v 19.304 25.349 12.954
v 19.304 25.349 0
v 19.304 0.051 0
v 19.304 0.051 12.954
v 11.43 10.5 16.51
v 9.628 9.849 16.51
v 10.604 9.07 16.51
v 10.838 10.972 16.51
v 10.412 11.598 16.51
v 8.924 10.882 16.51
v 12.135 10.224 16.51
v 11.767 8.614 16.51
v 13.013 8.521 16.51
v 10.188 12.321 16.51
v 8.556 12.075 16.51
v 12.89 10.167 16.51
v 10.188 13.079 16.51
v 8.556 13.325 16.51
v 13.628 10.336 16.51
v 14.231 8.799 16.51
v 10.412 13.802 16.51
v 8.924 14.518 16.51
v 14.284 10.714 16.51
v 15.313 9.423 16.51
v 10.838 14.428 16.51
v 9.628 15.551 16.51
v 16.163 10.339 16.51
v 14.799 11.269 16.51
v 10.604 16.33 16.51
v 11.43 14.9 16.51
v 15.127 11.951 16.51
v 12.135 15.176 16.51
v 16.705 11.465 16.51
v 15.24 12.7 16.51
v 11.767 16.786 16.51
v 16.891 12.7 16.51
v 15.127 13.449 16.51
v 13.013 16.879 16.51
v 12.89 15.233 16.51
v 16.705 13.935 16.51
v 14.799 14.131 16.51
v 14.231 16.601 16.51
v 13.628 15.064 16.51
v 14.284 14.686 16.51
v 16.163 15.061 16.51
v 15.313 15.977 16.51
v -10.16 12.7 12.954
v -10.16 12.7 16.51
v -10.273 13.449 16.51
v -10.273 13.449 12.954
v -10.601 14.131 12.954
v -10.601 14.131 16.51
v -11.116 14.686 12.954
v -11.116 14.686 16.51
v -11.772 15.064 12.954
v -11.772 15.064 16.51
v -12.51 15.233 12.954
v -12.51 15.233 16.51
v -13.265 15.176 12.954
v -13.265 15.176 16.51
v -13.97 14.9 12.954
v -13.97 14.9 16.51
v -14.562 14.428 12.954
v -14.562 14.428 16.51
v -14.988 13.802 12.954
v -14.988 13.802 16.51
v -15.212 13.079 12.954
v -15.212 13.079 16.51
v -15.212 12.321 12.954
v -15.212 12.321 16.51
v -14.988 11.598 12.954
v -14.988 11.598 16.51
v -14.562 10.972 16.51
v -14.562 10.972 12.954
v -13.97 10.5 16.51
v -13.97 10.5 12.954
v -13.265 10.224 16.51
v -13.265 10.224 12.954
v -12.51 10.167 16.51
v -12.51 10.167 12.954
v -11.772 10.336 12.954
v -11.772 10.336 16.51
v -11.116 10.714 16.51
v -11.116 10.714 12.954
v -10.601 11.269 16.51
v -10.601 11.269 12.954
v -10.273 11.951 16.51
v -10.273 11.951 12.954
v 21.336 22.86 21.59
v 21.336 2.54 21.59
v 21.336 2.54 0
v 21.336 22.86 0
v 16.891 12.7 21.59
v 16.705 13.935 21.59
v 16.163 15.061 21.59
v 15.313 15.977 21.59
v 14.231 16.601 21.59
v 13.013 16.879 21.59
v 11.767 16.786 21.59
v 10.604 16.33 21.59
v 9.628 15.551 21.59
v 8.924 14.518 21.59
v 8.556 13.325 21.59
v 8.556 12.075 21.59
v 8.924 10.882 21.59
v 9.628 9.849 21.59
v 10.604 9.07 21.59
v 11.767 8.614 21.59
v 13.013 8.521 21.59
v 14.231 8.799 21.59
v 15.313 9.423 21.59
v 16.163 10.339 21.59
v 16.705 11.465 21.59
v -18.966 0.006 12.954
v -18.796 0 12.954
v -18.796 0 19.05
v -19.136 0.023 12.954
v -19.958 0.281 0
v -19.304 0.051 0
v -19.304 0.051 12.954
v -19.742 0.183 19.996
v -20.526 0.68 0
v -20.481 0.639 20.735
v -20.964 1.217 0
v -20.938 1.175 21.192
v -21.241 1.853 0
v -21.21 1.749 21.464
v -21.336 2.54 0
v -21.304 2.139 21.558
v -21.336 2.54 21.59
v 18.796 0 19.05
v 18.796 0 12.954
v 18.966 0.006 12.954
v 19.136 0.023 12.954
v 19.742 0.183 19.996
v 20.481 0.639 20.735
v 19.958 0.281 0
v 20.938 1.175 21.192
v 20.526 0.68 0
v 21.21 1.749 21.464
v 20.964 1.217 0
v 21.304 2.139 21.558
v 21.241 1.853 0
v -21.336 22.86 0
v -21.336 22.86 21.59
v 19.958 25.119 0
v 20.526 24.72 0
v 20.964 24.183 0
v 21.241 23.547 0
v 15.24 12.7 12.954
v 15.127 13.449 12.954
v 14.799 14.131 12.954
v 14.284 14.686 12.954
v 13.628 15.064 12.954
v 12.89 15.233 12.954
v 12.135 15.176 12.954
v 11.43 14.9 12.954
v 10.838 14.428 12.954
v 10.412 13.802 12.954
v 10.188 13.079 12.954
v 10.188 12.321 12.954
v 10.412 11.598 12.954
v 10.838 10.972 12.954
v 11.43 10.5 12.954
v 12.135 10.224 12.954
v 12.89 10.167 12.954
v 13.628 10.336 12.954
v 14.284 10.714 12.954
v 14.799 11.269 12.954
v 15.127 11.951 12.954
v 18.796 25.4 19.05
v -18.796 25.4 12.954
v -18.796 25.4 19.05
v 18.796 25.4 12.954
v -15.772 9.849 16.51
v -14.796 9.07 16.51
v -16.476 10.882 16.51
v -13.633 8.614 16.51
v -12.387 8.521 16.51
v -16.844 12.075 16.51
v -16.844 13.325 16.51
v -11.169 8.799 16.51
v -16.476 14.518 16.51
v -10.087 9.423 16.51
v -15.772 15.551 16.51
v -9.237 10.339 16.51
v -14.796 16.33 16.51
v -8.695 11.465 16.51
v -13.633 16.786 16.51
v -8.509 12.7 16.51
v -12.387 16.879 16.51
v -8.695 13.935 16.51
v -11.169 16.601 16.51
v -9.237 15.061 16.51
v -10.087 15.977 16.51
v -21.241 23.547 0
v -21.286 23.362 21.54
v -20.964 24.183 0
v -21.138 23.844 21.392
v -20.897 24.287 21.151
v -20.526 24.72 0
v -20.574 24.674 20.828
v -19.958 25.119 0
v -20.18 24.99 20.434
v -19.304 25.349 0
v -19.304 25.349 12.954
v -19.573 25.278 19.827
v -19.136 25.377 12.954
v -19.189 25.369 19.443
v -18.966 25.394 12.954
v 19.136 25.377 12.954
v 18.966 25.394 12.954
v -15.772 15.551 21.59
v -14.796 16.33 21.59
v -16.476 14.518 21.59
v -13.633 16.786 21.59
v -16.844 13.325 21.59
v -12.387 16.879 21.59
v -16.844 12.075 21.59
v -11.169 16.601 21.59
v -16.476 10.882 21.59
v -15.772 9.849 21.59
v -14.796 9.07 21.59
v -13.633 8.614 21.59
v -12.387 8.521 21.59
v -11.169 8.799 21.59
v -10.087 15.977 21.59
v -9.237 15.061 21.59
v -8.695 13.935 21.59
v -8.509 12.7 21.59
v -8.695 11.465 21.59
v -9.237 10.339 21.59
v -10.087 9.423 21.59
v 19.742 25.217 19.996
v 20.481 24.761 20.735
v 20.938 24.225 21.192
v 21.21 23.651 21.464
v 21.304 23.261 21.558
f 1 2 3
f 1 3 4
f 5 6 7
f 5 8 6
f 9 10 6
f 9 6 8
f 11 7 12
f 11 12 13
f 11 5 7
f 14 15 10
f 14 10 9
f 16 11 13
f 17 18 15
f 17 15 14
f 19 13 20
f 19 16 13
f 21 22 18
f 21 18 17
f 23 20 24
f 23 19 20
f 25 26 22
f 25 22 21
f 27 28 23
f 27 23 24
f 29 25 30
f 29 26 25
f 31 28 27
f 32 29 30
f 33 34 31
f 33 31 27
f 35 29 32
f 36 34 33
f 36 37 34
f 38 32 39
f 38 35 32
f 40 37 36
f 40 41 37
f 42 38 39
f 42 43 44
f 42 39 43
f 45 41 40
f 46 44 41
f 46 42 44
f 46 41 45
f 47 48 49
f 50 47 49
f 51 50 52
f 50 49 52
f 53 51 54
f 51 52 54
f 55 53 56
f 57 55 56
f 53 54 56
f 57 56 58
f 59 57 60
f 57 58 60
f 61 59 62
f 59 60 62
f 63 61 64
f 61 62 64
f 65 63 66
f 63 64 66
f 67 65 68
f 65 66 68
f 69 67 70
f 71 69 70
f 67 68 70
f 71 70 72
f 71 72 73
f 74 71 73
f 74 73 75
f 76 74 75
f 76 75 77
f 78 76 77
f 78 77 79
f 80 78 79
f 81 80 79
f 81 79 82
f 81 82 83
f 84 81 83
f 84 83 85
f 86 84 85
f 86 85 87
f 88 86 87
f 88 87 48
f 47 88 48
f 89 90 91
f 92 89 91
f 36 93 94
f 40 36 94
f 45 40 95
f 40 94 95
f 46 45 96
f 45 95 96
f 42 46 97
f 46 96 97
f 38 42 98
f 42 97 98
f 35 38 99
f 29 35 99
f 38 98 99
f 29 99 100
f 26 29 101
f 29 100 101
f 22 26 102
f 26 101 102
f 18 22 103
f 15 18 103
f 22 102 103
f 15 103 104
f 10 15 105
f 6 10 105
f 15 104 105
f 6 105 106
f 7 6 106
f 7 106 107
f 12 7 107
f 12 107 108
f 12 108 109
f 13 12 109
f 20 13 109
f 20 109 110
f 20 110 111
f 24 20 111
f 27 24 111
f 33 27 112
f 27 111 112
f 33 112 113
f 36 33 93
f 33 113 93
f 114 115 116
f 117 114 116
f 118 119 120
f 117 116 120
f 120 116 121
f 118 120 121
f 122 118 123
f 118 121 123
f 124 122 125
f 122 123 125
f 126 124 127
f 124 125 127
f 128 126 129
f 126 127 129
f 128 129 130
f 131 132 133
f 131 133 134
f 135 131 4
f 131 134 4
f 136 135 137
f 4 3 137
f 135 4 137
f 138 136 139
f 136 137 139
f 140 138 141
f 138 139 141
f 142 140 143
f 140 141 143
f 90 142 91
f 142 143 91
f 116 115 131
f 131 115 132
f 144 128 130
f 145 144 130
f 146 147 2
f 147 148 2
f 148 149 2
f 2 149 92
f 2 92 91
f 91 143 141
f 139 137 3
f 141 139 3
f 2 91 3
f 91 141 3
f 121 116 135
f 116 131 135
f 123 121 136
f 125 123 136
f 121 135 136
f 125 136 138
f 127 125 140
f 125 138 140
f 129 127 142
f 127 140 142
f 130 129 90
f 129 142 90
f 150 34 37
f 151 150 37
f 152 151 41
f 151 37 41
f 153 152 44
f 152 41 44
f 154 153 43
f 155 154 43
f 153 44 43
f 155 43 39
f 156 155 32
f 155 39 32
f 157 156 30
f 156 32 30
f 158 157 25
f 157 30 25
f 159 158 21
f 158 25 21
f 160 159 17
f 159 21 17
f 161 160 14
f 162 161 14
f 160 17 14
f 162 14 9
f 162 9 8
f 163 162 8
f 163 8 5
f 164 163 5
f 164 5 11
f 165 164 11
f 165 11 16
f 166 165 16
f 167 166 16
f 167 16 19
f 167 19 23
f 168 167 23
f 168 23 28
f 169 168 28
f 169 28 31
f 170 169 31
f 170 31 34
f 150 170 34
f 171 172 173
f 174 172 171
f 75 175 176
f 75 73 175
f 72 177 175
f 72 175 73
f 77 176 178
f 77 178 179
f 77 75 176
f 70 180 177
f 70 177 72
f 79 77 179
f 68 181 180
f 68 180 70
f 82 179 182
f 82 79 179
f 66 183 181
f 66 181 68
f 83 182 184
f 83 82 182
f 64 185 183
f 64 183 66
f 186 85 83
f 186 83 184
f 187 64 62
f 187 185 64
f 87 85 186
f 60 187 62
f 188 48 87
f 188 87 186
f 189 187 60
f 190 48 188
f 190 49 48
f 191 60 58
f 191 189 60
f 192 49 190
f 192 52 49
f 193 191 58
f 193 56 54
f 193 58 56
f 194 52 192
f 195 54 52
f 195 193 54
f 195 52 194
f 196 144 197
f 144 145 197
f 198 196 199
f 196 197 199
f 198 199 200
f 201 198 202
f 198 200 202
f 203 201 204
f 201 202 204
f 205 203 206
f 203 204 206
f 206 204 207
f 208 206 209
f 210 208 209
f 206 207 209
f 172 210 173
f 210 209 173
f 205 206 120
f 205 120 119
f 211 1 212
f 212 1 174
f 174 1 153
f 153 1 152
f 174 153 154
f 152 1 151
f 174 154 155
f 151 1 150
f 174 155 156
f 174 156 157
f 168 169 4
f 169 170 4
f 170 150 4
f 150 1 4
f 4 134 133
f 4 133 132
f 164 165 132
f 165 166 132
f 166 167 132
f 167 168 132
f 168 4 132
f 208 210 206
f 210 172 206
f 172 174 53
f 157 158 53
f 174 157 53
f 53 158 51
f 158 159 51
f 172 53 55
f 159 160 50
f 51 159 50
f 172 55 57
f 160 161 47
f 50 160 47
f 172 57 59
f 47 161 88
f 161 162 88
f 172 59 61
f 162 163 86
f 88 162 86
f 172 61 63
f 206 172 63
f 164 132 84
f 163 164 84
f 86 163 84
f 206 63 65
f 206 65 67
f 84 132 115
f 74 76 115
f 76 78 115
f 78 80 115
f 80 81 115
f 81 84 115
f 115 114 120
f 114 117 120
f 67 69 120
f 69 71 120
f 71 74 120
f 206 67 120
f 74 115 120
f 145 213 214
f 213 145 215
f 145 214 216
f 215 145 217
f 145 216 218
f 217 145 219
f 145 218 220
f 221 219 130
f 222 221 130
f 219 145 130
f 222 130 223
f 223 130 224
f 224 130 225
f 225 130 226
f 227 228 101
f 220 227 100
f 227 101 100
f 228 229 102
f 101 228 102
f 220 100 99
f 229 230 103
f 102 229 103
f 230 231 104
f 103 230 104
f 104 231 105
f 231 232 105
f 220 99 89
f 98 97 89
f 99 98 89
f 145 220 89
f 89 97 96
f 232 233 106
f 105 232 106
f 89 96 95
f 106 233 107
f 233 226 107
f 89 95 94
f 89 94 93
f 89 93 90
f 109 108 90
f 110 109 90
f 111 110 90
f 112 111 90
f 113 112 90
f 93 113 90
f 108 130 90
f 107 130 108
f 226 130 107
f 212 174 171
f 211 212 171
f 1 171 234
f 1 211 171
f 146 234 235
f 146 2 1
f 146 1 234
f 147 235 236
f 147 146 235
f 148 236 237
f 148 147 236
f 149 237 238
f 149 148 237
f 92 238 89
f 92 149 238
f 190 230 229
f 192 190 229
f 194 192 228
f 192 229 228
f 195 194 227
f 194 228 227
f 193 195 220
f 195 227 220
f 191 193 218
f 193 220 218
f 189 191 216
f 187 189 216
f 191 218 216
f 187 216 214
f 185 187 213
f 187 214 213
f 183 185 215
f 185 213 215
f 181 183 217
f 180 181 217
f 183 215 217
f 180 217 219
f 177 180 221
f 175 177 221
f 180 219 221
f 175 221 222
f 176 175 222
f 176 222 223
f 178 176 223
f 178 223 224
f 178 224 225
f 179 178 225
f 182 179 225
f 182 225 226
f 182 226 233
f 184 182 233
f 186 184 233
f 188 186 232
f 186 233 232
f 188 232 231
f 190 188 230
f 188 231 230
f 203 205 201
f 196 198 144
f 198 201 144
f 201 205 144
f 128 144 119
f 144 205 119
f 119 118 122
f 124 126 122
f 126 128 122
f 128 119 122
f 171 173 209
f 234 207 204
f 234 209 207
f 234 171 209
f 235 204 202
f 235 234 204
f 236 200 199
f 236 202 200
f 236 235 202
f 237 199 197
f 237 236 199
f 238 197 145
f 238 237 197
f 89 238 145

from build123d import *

# Parameters (mm, degrees)
BOSS_EXTRUDE1_DEPTH = 25.4
SKETCH2_R           = 2.54
CUT_EXTRUDE1_DEPTH  = 40.579199032
SKETCH3_R           = 4.191
CUT_EXTRUDE2_DEPTH  = 5.08
FILLET1_R           = 2.54
FILLET2_R           = 2.54


with BuildPart() as part:
    # Sketch1 → Boss-Extrude1 (new body)
    with BuildSketch(Plane(origin=(0, 0, 0), x_dir=(1, 0, 0), z_dir=(0, 1, 0))):
        Polygon((-19.304, 0), (-21.336, 0), (-21.336, -21.59), (21.336, -21.59), (21.336, 0), (19.304, 0), (19.304, -12.954), (-19.304, -12.954), align=None)
    extrude(amount=BOSS_EXTRUDE1_DEPTH)

    # Sketch2 → Cut-Extrude1 (cut, through all)
    with BuildSketch(Plane.XY.offset(21.59)):
        with Locations((-12.7, 12.7)):
            Circle(SKETCH2_R)
        with Locations((12.7, 12.7)):
            Circle(SKETCH2_R)
    extrude(amount=-CUT_EXTRUDE1_DEPTH, mode=Mode.SUBTRACT)

    # Sketch3 → Cut-Extrude2 (cut)
    with BuildSketch(Plane.XY.offset(21.59)):
        with Locations((-12.7, 12.7)):
            Circle(SKETCH3_R)
        with Locations((12.7, 12.7)):
            Circle(SKETCH3_R)
    extrude(amount=-CUT_EXTRUDE2_DEPTH, mode=Mode.SUBTRACT)

    # Fillet1
    fillet1_edges = [part.edges().sort_by_distance(p)[0] for p in [
        (-21.336, 25.4, 10.795),
        (21.336, 25.4, 10.795),
        (0, 25.4, 21.59),
    ]]
    fillet(fillet1_edges, radius=FILLET1_R)

    # Fillet2
    fillet2_edges = [part.edges().sort_by_distance(p)[0] for p in [
        (-21.336, 0, 10.795),
        (0, 0, 21.59),
        (21.336, 0, 10.795),
    ]]
    fillet(fillet2_edges, radius=FILLET2_R)


solid = part.part
